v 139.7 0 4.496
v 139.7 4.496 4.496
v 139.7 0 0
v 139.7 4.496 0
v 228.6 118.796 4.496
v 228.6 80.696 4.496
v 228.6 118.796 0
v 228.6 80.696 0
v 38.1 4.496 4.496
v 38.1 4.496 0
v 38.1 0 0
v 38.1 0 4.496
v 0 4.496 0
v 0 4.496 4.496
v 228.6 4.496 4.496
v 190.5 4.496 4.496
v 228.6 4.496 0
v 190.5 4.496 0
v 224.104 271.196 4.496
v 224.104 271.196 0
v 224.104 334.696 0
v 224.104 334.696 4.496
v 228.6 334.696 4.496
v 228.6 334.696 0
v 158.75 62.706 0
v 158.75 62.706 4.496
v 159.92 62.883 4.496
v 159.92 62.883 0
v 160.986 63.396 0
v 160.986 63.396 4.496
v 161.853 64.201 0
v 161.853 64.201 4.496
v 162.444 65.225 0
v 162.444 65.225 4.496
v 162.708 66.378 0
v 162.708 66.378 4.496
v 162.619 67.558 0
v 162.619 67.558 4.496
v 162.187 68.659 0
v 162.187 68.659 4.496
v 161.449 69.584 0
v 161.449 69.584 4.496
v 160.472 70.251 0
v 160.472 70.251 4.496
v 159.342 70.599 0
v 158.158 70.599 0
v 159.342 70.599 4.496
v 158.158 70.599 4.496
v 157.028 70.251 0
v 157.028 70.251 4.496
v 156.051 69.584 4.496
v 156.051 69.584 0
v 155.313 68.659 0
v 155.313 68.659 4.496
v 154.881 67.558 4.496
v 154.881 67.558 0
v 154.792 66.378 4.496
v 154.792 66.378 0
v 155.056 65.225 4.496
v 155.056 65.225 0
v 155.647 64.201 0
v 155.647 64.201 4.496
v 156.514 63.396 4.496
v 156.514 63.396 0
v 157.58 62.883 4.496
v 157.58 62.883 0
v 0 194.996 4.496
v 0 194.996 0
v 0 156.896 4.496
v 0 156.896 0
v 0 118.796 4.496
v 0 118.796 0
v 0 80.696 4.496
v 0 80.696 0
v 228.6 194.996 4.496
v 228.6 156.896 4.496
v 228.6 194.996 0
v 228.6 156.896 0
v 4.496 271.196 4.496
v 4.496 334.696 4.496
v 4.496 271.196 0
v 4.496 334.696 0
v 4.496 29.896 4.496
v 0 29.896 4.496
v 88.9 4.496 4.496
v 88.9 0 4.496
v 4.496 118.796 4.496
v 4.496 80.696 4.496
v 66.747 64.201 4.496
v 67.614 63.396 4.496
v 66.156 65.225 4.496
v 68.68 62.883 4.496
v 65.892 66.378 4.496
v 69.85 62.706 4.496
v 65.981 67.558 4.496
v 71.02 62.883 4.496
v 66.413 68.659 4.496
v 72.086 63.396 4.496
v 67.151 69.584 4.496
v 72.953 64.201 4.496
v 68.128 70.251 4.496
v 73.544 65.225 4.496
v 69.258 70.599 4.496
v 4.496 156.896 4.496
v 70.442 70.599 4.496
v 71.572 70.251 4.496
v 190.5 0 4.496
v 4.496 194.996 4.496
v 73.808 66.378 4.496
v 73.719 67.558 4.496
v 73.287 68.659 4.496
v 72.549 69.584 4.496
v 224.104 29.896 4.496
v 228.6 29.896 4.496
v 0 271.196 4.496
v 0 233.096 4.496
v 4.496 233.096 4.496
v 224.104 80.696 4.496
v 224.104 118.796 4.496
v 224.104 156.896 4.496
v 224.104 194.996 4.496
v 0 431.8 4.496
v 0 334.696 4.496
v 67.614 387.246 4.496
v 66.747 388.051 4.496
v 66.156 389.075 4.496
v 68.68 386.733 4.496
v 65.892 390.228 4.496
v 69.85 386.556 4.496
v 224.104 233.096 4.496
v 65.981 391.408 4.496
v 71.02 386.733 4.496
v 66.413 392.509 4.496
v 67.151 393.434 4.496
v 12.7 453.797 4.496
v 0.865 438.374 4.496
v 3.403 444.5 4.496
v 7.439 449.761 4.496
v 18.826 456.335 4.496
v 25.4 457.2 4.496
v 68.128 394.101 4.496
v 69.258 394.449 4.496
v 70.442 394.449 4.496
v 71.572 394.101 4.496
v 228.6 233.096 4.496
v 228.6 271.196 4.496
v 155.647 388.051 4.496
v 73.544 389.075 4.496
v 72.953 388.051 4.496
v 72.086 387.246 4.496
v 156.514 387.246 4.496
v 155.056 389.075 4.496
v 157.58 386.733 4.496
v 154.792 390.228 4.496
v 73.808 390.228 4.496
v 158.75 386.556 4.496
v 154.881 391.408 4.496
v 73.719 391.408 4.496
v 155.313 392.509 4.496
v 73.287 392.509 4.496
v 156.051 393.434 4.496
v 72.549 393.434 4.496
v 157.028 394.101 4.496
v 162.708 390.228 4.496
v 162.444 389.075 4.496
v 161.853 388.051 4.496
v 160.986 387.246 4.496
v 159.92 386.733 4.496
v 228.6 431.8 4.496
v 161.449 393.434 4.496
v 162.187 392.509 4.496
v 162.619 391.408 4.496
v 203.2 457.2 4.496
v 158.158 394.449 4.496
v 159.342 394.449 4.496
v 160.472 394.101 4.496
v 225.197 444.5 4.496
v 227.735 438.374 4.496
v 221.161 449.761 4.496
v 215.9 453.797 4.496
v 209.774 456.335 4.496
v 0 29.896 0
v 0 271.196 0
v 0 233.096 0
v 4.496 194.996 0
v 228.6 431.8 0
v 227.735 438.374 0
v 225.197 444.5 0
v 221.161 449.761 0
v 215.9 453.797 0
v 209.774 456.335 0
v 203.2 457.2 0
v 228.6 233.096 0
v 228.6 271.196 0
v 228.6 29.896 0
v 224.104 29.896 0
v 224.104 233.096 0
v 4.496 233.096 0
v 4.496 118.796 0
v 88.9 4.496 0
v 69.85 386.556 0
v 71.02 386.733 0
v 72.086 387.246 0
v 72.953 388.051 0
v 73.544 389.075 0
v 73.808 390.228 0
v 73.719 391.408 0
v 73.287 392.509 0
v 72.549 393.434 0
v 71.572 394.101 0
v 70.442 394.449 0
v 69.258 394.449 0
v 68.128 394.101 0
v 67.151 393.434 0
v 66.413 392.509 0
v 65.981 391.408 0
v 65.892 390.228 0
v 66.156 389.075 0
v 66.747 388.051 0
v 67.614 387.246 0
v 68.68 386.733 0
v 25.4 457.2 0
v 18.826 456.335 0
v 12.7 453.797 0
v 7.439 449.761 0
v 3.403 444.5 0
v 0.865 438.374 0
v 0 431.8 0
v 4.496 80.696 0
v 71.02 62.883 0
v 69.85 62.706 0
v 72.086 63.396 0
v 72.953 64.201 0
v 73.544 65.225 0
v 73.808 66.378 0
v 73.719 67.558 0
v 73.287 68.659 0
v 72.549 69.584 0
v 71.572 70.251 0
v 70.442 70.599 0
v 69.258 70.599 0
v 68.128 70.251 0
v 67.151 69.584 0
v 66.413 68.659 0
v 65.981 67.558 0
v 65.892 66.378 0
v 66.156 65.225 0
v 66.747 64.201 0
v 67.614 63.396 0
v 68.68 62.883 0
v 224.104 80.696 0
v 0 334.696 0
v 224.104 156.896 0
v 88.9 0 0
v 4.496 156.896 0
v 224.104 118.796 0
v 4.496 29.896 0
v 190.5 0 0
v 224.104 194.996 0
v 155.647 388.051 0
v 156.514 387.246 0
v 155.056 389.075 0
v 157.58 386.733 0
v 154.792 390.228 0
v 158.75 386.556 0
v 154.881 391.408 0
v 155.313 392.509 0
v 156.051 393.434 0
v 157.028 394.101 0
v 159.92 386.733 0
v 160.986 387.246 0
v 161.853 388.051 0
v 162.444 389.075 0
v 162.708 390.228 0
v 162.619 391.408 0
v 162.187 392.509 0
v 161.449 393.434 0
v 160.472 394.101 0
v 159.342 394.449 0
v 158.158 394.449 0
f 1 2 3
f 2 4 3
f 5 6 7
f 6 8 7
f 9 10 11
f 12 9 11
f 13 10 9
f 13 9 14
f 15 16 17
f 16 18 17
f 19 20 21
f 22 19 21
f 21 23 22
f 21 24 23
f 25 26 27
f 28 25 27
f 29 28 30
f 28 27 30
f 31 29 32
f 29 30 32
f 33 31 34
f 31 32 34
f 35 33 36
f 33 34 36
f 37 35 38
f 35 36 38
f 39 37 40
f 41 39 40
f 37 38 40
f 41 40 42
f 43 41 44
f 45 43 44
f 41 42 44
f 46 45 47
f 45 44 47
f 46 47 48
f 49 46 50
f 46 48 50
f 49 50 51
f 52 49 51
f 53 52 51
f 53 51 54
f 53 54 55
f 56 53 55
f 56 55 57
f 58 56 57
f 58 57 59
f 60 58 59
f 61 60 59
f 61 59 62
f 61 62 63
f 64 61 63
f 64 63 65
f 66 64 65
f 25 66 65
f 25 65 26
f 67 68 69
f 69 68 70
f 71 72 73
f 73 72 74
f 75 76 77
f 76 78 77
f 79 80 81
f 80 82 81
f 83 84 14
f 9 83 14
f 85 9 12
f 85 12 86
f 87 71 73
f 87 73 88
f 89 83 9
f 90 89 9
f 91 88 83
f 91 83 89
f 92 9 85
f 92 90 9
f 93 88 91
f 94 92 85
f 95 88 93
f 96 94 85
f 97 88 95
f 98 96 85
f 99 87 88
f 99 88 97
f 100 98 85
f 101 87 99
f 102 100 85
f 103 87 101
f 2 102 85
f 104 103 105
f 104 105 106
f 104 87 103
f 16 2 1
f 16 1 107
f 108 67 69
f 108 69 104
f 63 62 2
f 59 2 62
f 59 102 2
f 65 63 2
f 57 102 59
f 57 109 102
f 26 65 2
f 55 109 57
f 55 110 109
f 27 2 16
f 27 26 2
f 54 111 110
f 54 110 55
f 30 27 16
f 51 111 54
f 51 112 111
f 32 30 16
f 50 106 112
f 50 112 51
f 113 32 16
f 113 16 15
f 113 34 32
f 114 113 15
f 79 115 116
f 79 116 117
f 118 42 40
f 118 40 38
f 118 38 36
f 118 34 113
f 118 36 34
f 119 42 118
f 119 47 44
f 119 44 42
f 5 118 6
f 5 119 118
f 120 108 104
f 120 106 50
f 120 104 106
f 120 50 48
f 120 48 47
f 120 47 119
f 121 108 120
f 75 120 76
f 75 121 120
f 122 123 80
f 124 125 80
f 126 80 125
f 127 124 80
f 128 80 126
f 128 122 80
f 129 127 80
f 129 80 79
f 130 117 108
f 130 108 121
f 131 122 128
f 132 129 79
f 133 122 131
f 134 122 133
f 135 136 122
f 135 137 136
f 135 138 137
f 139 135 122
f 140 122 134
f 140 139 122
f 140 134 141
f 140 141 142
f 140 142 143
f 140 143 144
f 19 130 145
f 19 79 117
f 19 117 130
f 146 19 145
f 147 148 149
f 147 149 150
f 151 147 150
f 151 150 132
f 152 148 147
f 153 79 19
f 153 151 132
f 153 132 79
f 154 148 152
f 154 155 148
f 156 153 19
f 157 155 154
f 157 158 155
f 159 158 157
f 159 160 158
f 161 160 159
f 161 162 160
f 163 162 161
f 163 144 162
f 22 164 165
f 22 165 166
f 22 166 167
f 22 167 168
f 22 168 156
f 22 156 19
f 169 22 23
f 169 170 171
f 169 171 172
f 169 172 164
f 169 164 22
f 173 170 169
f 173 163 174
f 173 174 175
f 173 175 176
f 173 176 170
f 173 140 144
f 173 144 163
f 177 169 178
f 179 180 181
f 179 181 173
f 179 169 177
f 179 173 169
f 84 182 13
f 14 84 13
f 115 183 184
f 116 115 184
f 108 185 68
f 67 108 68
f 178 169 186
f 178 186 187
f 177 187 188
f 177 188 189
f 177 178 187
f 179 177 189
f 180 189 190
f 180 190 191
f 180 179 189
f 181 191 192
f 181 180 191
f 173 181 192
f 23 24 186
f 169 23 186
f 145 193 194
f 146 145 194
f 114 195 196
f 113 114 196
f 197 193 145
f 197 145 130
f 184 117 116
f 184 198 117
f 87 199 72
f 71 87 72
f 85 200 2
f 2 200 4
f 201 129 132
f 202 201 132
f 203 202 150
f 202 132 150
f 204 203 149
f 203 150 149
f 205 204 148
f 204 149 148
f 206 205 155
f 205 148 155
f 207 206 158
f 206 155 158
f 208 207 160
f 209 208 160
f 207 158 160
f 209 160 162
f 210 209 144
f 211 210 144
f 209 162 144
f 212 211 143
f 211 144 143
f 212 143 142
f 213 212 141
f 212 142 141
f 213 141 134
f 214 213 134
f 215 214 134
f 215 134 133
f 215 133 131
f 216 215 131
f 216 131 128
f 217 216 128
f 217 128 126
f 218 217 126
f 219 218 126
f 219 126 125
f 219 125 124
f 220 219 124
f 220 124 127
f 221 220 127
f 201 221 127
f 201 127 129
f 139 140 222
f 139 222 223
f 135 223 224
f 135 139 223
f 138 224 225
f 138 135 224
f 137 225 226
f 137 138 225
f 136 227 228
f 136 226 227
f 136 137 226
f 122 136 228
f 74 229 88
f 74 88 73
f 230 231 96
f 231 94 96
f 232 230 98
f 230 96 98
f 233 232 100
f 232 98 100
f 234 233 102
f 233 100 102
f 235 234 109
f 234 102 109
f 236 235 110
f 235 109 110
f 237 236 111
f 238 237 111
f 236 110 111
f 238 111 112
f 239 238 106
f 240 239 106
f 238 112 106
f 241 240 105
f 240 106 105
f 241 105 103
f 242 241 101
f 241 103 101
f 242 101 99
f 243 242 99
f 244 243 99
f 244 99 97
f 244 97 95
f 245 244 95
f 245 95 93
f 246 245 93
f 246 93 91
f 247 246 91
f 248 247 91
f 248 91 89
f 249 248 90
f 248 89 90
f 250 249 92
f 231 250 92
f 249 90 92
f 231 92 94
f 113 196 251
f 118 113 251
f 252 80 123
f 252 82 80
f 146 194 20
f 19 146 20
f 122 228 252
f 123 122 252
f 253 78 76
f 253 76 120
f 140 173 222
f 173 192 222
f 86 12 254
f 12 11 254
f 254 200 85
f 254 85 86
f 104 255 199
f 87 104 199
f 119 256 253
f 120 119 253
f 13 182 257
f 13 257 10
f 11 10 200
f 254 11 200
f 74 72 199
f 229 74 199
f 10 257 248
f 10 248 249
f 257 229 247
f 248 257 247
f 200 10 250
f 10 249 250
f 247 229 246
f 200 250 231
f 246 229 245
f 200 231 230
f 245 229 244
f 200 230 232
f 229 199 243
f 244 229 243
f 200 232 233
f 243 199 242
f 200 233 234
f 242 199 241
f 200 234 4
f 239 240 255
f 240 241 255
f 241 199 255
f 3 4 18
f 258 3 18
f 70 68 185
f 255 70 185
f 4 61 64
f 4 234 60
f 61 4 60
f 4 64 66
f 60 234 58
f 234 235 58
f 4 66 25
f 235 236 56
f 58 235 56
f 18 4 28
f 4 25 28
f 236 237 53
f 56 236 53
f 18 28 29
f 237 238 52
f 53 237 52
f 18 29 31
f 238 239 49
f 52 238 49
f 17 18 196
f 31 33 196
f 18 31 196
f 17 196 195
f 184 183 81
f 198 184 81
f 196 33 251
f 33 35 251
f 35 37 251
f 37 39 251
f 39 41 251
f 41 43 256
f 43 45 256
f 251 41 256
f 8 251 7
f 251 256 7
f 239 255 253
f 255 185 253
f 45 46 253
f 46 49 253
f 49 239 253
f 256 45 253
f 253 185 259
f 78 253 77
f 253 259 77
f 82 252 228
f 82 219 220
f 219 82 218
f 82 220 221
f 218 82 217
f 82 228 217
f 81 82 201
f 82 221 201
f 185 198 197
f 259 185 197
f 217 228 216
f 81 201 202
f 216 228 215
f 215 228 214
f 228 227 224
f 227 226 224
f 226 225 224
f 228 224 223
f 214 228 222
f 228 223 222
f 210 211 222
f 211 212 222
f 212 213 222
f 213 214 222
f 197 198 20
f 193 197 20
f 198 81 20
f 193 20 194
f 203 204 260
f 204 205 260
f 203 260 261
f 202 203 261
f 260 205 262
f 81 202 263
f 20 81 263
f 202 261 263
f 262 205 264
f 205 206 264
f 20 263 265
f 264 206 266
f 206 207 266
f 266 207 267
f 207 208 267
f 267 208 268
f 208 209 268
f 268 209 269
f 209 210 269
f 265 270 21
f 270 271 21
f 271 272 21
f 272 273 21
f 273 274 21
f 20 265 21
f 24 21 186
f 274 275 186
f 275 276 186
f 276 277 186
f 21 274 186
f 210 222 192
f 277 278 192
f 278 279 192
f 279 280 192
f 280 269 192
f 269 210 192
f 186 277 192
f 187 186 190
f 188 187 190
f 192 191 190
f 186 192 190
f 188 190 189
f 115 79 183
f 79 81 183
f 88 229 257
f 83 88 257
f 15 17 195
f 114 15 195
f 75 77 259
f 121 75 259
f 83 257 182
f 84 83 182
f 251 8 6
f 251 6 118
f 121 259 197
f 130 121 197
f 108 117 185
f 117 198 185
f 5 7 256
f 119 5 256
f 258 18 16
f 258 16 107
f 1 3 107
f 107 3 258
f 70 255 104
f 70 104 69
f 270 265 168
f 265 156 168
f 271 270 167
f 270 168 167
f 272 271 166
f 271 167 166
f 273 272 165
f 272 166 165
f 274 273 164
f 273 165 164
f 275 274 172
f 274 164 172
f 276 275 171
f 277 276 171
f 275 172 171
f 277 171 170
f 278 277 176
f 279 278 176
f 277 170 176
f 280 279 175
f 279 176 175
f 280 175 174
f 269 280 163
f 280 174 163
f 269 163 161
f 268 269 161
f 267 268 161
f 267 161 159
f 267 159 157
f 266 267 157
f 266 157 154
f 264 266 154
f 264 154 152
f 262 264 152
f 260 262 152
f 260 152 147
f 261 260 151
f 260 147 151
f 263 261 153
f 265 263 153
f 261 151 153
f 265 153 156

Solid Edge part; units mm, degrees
sketch "Sketch1" plane through (0, 0, 0) normal (0, 0, 1) x (1, 0, 0)
  line L0 (0, 0) -> (228.6, 0)
  line L1 (228.6, 0) -> (228.6, 457.2)
  line L2 (228.6, 457.2) -> (0, 457.2)
  line L3 (0, 457.2) -> (0, 0)
  dimension "D1" = 228.6
  dimension "D2" = 457.2
extrude "Protrusion1" add sketch "Sketch1" along normal blind 4.4958
hole "Hole_1" at (69.85, 66.675, 4.4958) direction (0, 0, -1) diameter 7.9375 end up to next
hole "Hole1" at (158.75, 66.675, 4.4958) direction (0, 0, -1) diameter 7.9375 end up to next
hole "Hole2" at (158.75, 390.525, 4.4958) direction (0, 0, -1) diameter 7.9375 end up to next
hole "Hole3" at (69.85, 390.525, 4.4958) direction (0, 0, -1) diameter 7.9375 end up to next
fillet "Round_1" radius 25.4 2 edges at (228.6, 457.2, 2.2479) (0, 457.2, 2.2479)
sketch "Sketch2" plane through (114.3, 228.6, 0) normal (0, 0, -1) x (0, -1, 0)
  line L0 (-106.0958, 109.8042) -> (-106.0958, 114.3)
  line L1 (-106.0958, 114.3) -> (-42.5958, 114.3)
  line L2 (-42.5958, 109.8042) -> (-42.5958, 114.3)
  line L3 (-106.0958, 109.8042) -> (-42.5958, 109.8042)
  line L4 (147.9042, 114.3) -> (198.7042, 114.3)
  line L5 (198.7042, 109.8042) -> (198.7042, 114.3)
  line L6 (147.9042, 109.8042) -> (198.7042, 109.8042)
  line L7 (147.9042, 109.8042) -> (147.9042, 114.3)
  line L8 (-4.4958, 109.8042) -> (-4.4958, 114.3)
  line L9 (-4.4958, 114.3) -> (33.6042, 114.3)
  line L10 (33.6042, 109.8042) -> (33.6042, 114.3)
  line L11 (-4.4958, 109.8042) -> (33.6042, 109.8042)
  line L12 (71.7042, 109.8042) -> (71.7042, 114.3)
  line L13 (71.7042, 114.3) -> (109.8042, 114.3)
  line L14 (109.8042, 109.8042) -> (109.8042, 114.3)
  line L15 (71.7042, 109.8042) -> (109.8042, 109.8042)
extrude "Cutout1" cut sketch "Sketch2" against normal through all
mirror "Mirror1" about plane through (114.3, 0, 0) normal (-1, 0, 0) of "Cutout1"
sketch "Sketch3" plane through (114.3, 228.6, 0) normal (0, 0, -1) x (-1, 0, 0)
  line L0 (25.4, -224.1042) -> (-25.4, -224.1042)
  line L1 (-25.4, -224.1042) -> (-25.4, -228.6)
  line L2 (25.4, -228.6) -> (-25.4, -228.6)
  line L3 (25.4, -224.1042) -> (25.4, -228.6)
  line L4 (-76.2, -224.1042) -> (-76.2, -228.6)
  line L5 (-76.2, -228.6) -> (-114.3, -228.6)
  line L6 (-114.3, -224.1042) -> (-114.3, -228.6)
  line L7 (-76.2, -224.1042) -> (-114.3, -224.1042)
  line L8 (76.2, -224.1042) -> (76.2, -228.6)
  line L9 (114.3, -228.6) -> (76.2, -228.6)
  line L10 (114.3, -224.1042) -> (114.3, -228.6)
  line L11 (76.2, -224.1042) -> (114.3, -224.1042)
extrude "Cutout3" cut sketch "Sketch3" against normal through all
properties material "Acrylic, high impact grade"
